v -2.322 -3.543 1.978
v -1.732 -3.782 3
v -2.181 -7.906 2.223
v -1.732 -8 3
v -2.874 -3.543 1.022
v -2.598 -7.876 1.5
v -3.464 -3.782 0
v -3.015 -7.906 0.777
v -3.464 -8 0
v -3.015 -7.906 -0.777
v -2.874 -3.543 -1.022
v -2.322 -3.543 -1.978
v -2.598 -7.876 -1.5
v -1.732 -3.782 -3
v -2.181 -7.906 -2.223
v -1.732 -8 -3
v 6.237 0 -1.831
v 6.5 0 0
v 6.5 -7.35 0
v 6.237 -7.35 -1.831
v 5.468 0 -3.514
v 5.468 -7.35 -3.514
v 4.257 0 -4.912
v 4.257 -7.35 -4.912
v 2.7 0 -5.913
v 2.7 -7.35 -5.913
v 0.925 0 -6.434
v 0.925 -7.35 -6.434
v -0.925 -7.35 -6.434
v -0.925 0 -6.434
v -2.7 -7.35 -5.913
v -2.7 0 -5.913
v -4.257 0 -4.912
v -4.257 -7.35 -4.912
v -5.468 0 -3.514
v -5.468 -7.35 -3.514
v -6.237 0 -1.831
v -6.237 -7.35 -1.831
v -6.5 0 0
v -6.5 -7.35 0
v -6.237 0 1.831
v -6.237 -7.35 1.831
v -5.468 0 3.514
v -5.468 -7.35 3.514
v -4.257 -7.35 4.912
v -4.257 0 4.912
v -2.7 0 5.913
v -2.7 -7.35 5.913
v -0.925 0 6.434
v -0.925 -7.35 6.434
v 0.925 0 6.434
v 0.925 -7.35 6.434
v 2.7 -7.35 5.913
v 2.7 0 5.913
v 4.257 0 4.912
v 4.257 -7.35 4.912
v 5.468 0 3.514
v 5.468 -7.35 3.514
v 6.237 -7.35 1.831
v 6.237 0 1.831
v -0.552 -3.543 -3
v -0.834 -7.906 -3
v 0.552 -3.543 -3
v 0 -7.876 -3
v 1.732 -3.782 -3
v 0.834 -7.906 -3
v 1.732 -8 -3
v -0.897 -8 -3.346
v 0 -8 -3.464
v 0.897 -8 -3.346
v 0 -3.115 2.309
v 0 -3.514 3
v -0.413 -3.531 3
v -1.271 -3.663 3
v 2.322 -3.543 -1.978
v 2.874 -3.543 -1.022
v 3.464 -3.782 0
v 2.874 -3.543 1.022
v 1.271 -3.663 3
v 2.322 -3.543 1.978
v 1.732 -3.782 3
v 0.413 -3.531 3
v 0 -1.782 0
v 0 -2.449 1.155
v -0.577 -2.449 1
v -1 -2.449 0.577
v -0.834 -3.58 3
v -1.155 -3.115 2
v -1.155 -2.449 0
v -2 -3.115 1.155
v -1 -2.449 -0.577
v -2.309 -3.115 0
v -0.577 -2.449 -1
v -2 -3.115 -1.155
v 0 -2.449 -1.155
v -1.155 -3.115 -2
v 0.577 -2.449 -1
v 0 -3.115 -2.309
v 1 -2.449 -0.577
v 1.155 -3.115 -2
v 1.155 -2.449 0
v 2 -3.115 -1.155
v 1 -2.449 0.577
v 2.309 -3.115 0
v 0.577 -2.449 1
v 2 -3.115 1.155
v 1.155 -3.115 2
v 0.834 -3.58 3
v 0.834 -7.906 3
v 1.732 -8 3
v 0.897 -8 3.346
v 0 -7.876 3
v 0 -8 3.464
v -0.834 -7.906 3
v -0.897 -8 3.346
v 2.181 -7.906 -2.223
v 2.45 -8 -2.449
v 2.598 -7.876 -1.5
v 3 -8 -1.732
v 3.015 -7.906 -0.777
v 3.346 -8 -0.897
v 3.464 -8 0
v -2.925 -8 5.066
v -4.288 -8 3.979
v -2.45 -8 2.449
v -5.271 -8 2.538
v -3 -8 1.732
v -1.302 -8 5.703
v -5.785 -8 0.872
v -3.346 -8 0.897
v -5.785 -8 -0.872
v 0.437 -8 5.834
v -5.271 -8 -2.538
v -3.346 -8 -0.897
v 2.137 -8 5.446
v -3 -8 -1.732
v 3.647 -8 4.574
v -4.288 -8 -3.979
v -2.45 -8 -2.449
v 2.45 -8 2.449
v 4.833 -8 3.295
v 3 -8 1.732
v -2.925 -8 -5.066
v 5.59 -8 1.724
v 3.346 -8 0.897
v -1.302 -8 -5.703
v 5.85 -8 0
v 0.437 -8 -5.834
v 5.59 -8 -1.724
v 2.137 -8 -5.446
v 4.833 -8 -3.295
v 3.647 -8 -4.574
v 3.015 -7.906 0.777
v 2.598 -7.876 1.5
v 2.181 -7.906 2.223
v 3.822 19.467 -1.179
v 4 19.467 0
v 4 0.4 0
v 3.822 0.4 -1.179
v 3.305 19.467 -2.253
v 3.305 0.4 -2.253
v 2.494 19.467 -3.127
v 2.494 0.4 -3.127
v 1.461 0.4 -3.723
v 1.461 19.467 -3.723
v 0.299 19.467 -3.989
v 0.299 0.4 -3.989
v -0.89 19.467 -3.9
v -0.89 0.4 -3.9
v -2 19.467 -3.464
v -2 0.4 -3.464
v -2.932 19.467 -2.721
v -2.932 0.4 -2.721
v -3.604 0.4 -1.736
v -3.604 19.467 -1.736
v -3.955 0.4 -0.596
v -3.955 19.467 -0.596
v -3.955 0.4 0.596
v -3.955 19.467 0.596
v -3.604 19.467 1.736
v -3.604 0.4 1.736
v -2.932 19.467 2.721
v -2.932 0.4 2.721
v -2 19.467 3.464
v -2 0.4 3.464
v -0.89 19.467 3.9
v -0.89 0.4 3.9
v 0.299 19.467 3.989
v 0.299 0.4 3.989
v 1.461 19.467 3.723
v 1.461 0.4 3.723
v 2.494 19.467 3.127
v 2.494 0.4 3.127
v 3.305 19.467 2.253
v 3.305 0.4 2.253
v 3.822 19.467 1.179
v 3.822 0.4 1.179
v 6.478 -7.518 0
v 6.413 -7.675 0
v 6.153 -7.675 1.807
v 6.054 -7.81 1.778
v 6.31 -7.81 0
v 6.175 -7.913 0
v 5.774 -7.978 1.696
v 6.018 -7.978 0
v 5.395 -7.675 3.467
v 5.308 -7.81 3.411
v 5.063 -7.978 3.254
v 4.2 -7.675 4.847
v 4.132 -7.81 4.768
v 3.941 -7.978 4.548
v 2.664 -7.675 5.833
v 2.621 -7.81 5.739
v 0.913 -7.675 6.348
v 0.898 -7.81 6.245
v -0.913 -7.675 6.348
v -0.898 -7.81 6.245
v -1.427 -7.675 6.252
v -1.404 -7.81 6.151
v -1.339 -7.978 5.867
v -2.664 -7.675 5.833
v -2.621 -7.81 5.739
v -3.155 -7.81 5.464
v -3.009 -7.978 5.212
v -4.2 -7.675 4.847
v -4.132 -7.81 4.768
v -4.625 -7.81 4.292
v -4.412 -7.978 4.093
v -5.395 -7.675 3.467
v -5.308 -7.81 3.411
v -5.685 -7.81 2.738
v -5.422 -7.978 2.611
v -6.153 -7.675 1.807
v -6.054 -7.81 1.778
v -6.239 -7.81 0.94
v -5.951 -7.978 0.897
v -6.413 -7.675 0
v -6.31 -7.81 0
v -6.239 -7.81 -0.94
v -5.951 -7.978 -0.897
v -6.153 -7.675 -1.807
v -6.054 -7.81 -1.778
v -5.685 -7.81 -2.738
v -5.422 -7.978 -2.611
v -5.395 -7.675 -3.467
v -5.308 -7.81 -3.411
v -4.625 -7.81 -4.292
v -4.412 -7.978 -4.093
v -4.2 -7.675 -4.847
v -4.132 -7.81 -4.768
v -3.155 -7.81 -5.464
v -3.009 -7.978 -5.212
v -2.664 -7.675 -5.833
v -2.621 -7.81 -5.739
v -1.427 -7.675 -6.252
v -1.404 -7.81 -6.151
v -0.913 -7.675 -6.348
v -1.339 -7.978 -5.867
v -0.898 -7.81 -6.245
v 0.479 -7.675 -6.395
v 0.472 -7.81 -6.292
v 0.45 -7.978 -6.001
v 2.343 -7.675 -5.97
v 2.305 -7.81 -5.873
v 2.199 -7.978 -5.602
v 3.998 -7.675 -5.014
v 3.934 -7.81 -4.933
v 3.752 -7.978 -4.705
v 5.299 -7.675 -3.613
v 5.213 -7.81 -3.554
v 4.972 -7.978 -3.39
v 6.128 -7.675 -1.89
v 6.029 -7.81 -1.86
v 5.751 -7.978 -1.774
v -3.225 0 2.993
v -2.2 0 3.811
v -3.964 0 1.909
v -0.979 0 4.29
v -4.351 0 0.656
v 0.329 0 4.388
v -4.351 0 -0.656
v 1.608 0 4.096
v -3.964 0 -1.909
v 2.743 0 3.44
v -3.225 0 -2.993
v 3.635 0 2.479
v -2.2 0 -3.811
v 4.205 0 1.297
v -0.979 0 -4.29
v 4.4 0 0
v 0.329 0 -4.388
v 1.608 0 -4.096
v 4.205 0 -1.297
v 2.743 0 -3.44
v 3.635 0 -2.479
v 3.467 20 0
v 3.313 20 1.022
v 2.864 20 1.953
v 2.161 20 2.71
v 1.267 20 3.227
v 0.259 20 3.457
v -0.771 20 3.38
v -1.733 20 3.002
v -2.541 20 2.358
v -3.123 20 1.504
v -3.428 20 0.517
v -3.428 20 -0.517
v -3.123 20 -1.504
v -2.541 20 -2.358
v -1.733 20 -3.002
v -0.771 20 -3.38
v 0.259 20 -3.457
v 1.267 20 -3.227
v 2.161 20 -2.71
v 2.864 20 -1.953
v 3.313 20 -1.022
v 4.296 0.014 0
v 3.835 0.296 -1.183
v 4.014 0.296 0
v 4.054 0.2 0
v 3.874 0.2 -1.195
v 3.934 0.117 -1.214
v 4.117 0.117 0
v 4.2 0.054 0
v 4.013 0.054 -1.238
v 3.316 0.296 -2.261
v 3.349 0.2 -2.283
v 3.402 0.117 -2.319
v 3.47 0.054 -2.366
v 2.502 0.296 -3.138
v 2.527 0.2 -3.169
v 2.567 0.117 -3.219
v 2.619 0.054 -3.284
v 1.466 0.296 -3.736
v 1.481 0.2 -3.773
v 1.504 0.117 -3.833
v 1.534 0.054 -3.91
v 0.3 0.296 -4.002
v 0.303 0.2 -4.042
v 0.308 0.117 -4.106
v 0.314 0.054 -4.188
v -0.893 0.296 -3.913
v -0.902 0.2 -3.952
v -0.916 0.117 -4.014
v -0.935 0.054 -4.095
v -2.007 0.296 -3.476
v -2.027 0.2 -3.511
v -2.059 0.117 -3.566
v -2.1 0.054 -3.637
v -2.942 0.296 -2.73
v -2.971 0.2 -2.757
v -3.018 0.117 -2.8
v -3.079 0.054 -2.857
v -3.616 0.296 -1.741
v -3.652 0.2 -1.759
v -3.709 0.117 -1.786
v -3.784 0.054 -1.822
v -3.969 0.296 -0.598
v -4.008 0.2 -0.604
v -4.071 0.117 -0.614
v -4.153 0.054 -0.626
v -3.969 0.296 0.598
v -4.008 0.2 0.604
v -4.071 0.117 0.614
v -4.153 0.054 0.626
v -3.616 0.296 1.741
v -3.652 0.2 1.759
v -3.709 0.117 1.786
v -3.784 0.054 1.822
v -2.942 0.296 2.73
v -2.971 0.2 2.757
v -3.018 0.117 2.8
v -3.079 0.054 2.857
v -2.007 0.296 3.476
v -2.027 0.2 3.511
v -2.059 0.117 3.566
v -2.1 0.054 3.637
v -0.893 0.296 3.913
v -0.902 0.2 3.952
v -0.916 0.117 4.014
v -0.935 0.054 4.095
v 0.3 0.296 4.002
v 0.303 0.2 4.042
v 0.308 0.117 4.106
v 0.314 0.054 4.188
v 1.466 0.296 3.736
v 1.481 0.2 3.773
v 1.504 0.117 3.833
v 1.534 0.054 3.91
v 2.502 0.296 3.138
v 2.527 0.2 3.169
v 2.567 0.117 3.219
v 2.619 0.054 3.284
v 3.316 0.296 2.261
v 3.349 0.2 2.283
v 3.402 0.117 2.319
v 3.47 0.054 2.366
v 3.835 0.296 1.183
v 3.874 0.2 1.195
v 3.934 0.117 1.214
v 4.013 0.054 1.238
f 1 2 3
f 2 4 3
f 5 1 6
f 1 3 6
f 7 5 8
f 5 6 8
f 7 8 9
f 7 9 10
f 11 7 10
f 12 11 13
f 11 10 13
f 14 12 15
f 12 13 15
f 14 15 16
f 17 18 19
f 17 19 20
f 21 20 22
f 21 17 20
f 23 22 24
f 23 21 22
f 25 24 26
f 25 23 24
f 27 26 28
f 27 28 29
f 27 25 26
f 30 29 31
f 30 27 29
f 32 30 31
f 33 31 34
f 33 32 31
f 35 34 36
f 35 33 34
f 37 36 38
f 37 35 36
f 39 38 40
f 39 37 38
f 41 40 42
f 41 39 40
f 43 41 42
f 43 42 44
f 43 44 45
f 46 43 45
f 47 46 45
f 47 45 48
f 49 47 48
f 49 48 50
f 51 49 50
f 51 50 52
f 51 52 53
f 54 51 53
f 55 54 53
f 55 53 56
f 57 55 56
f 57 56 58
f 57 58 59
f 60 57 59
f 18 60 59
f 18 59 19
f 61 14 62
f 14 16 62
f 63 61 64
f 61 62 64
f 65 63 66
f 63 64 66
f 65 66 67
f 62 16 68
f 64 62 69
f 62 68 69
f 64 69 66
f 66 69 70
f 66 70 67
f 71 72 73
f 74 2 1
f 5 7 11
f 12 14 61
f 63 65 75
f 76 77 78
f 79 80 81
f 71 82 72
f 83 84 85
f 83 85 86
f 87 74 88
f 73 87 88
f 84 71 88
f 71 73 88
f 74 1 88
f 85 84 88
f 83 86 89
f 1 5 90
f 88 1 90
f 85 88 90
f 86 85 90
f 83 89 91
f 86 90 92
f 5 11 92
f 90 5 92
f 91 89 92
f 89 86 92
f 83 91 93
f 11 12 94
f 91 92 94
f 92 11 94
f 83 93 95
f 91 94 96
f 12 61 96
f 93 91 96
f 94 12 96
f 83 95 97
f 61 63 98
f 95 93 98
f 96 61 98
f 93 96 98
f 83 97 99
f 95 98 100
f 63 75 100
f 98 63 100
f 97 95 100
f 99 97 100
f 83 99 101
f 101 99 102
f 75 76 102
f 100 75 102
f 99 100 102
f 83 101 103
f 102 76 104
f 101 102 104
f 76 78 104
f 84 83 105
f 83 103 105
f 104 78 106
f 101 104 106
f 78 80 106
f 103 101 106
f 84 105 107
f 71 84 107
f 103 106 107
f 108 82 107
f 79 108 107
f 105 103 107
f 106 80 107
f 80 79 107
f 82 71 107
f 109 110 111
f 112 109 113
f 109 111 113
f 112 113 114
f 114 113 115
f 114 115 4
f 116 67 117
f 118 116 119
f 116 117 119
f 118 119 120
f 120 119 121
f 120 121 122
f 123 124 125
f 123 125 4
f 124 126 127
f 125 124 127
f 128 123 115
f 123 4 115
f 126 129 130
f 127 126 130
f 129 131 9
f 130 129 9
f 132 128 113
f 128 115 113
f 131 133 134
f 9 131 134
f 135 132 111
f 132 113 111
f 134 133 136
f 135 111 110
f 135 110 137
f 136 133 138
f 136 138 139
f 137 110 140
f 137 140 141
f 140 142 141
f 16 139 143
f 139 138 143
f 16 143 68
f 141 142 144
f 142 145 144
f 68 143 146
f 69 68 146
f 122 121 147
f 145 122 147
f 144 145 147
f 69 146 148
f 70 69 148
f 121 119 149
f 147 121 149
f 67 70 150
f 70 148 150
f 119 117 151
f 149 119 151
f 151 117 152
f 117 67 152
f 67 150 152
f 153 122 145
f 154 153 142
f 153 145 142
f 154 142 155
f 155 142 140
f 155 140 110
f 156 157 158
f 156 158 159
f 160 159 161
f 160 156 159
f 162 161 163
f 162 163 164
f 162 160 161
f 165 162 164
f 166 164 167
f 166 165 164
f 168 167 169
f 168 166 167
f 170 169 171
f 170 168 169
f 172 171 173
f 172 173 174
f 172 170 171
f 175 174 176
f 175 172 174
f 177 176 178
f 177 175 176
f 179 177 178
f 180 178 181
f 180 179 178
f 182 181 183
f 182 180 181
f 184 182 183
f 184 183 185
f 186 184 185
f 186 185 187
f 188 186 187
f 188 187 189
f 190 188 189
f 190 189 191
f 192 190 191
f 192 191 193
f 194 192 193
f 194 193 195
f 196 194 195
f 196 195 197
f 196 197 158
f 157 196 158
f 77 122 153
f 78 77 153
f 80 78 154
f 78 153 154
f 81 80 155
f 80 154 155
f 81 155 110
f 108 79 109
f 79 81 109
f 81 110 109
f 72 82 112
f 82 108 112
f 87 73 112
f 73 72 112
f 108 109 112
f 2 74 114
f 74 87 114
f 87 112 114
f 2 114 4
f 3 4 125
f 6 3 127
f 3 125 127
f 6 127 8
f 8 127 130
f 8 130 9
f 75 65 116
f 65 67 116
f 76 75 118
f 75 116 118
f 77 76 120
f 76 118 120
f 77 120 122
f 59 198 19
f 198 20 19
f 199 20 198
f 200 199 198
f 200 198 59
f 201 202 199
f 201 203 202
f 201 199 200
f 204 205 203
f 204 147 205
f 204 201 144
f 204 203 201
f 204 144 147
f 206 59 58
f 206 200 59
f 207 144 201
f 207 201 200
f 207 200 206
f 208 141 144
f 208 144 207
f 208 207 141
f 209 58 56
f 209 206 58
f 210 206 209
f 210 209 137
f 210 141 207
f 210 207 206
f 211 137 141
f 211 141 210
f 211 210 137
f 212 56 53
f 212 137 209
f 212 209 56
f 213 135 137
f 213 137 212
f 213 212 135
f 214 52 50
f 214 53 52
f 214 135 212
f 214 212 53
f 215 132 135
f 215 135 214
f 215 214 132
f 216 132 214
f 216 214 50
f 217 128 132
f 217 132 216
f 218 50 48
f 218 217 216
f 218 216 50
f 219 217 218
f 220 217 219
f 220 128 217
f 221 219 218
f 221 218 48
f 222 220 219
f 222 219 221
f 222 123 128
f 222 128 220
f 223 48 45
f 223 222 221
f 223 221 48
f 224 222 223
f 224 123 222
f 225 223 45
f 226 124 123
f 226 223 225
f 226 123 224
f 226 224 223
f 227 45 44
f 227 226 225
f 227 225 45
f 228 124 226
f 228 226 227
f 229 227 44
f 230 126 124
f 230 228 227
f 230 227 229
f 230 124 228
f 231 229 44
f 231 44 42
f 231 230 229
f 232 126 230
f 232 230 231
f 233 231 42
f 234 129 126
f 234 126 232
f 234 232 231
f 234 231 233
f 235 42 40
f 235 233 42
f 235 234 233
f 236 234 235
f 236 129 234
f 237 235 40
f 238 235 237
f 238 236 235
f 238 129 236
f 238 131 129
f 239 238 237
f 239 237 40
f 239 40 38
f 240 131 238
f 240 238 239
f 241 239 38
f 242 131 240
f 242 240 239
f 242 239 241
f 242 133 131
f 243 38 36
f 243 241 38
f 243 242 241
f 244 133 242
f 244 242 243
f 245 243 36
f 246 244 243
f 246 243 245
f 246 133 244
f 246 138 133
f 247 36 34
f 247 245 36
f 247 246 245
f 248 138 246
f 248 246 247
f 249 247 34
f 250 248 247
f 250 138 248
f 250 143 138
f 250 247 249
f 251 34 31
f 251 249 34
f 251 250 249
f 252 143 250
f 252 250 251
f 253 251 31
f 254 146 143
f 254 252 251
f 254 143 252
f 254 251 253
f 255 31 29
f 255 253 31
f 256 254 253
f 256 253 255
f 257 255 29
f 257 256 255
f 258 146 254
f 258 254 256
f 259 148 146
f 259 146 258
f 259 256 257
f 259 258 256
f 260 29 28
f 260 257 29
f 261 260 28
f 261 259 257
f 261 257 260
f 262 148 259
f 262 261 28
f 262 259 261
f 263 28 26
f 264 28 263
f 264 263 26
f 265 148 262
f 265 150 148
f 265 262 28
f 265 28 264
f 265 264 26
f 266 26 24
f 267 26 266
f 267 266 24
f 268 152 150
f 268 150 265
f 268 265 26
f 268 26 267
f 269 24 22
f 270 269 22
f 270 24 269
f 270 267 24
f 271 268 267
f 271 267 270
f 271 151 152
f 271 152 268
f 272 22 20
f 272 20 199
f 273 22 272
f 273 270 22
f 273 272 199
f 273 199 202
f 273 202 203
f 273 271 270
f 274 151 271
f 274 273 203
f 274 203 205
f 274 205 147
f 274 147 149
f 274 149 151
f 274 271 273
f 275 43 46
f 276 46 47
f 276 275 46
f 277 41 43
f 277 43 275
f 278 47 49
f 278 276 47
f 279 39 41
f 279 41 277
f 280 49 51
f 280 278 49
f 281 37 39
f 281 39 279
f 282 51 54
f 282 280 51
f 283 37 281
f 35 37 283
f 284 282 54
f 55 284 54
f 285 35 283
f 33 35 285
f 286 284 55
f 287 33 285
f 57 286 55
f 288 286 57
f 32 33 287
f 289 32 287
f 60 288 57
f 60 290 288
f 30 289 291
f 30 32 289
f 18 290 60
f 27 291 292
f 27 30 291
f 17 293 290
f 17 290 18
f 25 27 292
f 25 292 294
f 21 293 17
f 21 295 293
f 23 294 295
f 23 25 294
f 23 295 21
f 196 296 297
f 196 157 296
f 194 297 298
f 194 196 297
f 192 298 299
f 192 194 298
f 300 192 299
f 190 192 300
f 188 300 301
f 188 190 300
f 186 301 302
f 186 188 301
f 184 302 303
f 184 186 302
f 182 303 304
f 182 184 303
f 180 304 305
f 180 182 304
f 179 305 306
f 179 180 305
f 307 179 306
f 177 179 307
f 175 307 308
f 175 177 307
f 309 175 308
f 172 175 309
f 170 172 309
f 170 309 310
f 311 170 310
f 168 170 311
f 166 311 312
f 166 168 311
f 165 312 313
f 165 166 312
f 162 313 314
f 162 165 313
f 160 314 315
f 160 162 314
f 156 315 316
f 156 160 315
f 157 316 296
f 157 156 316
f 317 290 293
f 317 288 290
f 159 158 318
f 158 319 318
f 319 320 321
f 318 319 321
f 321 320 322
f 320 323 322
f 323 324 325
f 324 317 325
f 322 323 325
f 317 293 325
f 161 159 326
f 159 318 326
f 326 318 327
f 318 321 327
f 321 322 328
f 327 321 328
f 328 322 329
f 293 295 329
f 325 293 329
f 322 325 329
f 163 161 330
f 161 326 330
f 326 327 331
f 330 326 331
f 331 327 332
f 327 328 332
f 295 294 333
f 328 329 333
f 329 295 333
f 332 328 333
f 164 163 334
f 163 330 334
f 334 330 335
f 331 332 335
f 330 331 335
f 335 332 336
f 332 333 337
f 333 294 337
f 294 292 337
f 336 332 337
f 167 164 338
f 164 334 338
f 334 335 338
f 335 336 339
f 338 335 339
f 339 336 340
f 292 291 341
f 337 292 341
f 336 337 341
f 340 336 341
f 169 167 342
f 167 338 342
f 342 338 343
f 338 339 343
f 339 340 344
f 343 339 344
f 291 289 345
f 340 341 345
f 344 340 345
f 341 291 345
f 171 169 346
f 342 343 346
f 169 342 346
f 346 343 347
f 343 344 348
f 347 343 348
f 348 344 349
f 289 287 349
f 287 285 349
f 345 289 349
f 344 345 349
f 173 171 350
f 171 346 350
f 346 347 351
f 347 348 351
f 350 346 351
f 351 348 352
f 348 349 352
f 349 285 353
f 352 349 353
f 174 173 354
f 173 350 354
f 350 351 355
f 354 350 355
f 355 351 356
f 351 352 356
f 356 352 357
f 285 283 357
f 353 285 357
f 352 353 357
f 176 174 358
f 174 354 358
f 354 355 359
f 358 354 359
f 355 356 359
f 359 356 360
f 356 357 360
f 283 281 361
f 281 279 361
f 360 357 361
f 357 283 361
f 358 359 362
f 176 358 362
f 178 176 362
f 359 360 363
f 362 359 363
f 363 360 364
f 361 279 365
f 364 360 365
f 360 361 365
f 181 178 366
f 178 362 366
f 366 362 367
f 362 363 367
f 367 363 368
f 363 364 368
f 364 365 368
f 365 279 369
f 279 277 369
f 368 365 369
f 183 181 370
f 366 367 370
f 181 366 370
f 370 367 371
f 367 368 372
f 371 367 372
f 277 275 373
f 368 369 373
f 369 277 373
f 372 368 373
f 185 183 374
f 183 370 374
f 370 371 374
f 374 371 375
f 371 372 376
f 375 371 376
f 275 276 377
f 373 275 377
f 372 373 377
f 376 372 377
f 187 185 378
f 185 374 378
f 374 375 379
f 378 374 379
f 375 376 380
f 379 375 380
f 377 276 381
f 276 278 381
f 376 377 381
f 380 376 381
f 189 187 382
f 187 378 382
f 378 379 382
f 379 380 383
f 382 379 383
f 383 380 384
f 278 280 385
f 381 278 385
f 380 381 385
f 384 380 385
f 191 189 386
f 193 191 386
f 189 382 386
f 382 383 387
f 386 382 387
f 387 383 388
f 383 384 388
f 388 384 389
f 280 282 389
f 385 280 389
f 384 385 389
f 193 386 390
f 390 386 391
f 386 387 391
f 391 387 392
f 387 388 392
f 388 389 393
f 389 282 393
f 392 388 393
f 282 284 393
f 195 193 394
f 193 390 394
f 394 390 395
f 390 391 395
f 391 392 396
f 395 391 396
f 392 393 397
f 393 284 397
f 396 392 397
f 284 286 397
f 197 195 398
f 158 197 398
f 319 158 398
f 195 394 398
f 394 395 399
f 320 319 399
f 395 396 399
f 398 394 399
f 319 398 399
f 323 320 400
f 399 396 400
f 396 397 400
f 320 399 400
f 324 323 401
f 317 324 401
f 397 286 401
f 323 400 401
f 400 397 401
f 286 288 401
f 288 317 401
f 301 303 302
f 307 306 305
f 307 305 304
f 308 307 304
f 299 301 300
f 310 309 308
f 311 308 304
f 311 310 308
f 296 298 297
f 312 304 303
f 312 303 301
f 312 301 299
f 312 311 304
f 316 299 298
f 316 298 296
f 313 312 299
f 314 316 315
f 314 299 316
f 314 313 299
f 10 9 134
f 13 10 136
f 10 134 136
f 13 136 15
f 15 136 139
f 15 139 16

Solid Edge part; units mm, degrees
sketch "Sketch1" plane through (0, 0, 0) normal (0, 0, 1) x (1, 0, 0)
  line L0 (4, 0) -> (4, 20)
  line L1 (0, 20) -> (4, 20)
  line L2 (0, 0) -> (0, 20)
  line L3 (0, 0) -> (0, -8)
  line L4 (0, -8) -> (6.5, -8)
  line L5 (6.5, -8) -> (6.5, 0)
  line L6 (6.5, 0) -> (4, 0)
revolve "RevolvedProtrusion1" add sketch "Sketch1" angle 360 about axis through (0, 0, 0) along (0, 1, 0)
sketch "Sketch2" plane through (0, 0, 0) normal (1, 0, 0) x (0, 1, 0)
  line L0 (-8, 3.8415) -> (-4, 3.8415)
  line L1 (-1.7821, 0) -> (-4, 3.8415)
  line L2 (-8, 0) -> (-1.7821, 0)
  line L3 (-8, 0) -> (-8, 3.8415)
revolve "RevolvedCutout1" cut sketch "Sketch2" angle 360 about axis through (0, -4.5, 0) along (0, 1, 0)
sketch "Sketch3" plane through (0, -8, 0) normal (0, -1, 0) x (0, 0, 1)
  circle A0 centre (0, 0) radius 3.8415
  line L0 (-3, -1.7321) -> (0, -3.4641)
  line L1 (0, -3.4641) -> (3, -1.7321)
  line L2 (3, -1.7321) -> (3, 1.7321)
  line L3 (3, 1.7321) -> (0, 3.4641)
  line L4 (0, 3.4641) -> (-3, 1.7321)
  line L5 (-3, 1.7321) -> (-3, -1.7321)
  dimension "D1" = 6
extrude "Protrusion1" add sketch "Sketch3" against normal up to next
sketch "Sketch4" plane through (0, 0, 0) normal (0, 0, 1) x (1, 0, 0)
  line L0 (-3.4641, -8) -> (0, -8)
  line L1 (0, -8) -> (0, -7.0718)
  line L2 (0, -7.0718) -> (-3.4641, -8)
revolve "RevolvedCutout2" cut sketch "Sketch4" angle 360 about axis through (0, -4.5, 0) along (0, 1, 0)
fillet "Round1" radius 0.4 1 edges at (0, 0, -4)
fillet "Round2" radius 0.65 1 edges at (0, -8, -6.5)
chamfer "倒斜角_2" distance 0.5333 angle 45 1 edges at (0, 20, -4)
cosmetic_thread "螺纹_3" size "M8" thread depth 16
